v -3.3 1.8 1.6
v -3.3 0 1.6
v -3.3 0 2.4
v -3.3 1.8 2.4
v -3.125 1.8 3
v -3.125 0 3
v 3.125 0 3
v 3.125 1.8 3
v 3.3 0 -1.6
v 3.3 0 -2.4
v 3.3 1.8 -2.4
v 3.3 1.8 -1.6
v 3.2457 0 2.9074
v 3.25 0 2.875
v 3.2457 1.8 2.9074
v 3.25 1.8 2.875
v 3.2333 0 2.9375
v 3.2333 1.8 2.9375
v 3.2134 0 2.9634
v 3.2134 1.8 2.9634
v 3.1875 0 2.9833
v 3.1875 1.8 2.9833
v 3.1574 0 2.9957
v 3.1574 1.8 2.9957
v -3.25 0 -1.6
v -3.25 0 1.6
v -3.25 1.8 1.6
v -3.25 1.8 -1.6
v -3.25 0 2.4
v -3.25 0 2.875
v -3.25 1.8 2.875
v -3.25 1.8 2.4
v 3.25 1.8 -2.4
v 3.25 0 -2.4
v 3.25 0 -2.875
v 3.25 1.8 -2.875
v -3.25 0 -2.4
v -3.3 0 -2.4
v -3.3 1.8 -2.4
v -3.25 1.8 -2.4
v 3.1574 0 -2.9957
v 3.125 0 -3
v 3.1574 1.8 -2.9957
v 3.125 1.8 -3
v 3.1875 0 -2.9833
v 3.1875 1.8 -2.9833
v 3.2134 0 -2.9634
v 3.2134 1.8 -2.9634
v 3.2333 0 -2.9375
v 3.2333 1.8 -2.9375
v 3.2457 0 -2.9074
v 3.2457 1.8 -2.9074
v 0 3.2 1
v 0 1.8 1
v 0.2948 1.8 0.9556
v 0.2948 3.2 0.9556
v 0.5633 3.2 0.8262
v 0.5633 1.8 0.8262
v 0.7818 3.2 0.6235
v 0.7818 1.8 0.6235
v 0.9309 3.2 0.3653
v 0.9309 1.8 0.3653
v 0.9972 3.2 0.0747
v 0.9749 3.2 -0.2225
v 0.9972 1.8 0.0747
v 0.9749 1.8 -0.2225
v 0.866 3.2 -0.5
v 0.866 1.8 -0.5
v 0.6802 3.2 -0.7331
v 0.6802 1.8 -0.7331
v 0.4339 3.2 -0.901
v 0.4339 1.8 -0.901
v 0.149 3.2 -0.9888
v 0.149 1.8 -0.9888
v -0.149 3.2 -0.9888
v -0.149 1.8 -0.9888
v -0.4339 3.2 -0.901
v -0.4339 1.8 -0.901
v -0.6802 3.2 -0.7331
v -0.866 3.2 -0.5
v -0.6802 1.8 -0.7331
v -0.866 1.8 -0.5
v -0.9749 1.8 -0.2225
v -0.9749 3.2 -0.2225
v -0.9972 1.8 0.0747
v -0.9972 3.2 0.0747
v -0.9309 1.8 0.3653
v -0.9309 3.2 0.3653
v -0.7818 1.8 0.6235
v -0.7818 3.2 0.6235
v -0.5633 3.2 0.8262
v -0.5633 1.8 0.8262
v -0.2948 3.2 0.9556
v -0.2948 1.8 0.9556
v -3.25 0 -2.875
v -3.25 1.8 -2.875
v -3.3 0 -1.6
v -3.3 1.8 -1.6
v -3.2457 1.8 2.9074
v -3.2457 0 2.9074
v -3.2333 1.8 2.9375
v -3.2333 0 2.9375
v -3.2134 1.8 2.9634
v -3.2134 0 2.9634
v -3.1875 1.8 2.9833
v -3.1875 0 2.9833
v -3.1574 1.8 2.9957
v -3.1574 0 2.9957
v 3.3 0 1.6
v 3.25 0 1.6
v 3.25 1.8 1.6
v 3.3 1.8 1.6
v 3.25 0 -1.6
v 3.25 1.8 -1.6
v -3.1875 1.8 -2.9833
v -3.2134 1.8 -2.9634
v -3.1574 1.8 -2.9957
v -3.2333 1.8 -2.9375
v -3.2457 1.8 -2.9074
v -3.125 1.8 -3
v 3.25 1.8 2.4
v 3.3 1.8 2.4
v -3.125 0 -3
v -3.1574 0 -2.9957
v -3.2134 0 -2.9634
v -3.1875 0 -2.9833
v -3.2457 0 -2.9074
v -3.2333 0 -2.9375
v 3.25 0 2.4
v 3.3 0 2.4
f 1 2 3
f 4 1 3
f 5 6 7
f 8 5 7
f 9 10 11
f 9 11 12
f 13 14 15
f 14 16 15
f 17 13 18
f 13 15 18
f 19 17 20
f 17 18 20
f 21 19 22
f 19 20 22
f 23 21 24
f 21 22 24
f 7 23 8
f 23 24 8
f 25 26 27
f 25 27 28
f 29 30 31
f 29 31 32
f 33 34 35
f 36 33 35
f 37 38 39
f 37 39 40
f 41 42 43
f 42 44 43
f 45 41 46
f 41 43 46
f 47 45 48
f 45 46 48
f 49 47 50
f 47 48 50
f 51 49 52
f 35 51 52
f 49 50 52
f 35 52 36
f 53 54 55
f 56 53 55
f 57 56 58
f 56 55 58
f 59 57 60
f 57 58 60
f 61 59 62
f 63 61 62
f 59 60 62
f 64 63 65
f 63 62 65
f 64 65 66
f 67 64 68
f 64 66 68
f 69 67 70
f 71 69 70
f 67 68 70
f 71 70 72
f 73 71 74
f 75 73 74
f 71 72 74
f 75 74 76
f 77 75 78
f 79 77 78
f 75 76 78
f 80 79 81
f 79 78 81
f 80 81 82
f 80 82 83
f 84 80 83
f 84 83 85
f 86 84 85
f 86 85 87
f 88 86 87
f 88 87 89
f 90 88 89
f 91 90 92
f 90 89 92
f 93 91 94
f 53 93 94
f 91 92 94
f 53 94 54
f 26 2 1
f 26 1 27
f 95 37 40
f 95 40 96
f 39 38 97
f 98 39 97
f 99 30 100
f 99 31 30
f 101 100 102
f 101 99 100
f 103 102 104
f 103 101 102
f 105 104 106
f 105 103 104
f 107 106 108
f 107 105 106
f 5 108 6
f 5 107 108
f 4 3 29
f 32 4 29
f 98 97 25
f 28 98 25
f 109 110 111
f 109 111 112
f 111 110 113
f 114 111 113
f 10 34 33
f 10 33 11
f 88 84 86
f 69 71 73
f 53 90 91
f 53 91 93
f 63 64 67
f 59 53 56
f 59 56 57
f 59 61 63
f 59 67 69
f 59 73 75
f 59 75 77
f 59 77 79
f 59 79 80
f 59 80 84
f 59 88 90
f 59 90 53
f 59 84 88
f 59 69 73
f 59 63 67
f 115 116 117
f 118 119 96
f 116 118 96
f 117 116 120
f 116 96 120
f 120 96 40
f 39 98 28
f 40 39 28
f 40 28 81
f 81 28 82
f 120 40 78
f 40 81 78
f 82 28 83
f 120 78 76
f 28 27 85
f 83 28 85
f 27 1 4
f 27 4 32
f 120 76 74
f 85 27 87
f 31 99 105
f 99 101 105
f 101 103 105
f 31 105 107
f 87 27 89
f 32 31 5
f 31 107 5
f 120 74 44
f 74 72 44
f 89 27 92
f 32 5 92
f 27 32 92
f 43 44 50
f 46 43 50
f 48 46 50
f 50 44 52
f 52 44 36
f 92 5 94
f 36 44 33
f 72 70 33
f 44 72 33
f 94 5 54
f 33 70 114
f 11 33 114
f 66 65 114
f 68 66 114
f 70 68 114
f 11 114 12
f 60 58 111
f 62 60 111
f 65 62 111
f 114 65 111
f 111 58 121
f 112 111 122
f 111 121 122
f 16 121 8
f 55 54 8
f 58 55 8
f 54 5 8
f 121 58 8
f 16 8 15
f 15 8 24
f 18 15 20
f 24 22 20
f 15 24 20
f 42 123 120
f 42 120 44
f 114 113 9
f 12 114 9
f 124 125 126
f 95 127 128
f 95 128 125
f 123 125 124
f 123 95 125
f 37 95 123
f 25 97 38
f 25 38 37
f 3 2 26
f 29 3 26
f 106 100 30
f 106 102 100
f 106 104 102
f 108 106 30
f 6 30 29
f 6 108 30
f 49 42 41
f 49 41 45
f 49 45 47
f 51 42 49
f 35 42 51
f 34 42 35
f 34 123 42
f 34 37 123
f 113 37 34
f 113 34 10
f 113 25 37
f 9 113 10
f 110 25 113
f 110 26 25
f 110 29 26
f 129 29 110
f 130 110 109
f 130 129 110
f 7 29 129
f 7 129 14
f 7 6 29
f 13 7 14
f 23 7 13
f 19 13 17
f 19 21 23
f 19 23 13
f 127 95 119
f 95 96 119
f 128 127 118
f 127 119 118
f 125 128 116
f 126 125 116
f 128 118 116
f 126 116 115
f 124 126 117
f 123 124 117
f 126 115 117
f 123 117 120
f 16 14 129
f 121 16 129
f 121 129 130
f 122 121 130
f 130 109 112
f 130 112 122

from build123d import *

# Parameters (mm, degrees)
SKETCH1_W           = 6.5
SKETCH1_H           = 6
BOSS_EXTRUDE1_DEPTH = 1.8
SKETCH2_W           = 1
SKETCH2_H           = 0.8
BOSS_EXTRUDE2_DEPTH = 1.8
SKETCH3_R           = 1
BOSS_EXTRUDE3_DEPTH = 1.4
FILLET1_R           = 0.125


with BuildPart() as part:
    # Sketch1 → Boss-Extrude1 (new body)
    with BuildSketch(Plane(origin=(0, 0, 0), x_dir=(1, 0, 0), z_dir=(0, 1, 0))):
        Rectangle(SKETCH1_W, SKETCH1_H)
    extrude(amount=BOSS_EXTRUDE1_DEPTH)

    # Sketch2 → Boss-Extrude2 (add)
    with BuildSketch(Plane.XZ):
        with Locations((-2.8, 2)):
            Rectangle(SKETCH2_W, SKETCH2_H)
        with Locations((-2.8, -2)):
            Rectangle(SKETCH2_W, SKETCH2_H)
        with Locations((2.8, -2)):
            Rectangle(SKETCH2_W, SKETCH2_H)
        with Locations((2.8, 2)):
            Rectangle(SKETCH2_W, SKETCH2_H)
    extrude(amount=-BOSS_EXTRUDE2_DEPTH)

    # Sketch3 → Boss-Extrude3 (add)
    with BuildSketch(Plane(origin=(0, 1.8, 0), x_dir=(1, 0, 0), z_dir=(0, 1, 0))):
        with Locations(Location((0, 0, 0), (0, 0, 270))):
            Circle(SKETCH3_R)
    extrude(amount=BOSS_EXTRUDE3_DEPTH)

    # Fillet1
    fillet1_edges = [part.edges().sort_by_distance(p)[0] for p in [
        (-3.25, 0.9, -3),
        (3.25, 0.9, -3),
        (3.25, 0.9, 3),
        (-3.25, 0.9, 3),
    ]]
    fillet(fillet1_edges, radius=FILLET1_R)


solid = part.part
